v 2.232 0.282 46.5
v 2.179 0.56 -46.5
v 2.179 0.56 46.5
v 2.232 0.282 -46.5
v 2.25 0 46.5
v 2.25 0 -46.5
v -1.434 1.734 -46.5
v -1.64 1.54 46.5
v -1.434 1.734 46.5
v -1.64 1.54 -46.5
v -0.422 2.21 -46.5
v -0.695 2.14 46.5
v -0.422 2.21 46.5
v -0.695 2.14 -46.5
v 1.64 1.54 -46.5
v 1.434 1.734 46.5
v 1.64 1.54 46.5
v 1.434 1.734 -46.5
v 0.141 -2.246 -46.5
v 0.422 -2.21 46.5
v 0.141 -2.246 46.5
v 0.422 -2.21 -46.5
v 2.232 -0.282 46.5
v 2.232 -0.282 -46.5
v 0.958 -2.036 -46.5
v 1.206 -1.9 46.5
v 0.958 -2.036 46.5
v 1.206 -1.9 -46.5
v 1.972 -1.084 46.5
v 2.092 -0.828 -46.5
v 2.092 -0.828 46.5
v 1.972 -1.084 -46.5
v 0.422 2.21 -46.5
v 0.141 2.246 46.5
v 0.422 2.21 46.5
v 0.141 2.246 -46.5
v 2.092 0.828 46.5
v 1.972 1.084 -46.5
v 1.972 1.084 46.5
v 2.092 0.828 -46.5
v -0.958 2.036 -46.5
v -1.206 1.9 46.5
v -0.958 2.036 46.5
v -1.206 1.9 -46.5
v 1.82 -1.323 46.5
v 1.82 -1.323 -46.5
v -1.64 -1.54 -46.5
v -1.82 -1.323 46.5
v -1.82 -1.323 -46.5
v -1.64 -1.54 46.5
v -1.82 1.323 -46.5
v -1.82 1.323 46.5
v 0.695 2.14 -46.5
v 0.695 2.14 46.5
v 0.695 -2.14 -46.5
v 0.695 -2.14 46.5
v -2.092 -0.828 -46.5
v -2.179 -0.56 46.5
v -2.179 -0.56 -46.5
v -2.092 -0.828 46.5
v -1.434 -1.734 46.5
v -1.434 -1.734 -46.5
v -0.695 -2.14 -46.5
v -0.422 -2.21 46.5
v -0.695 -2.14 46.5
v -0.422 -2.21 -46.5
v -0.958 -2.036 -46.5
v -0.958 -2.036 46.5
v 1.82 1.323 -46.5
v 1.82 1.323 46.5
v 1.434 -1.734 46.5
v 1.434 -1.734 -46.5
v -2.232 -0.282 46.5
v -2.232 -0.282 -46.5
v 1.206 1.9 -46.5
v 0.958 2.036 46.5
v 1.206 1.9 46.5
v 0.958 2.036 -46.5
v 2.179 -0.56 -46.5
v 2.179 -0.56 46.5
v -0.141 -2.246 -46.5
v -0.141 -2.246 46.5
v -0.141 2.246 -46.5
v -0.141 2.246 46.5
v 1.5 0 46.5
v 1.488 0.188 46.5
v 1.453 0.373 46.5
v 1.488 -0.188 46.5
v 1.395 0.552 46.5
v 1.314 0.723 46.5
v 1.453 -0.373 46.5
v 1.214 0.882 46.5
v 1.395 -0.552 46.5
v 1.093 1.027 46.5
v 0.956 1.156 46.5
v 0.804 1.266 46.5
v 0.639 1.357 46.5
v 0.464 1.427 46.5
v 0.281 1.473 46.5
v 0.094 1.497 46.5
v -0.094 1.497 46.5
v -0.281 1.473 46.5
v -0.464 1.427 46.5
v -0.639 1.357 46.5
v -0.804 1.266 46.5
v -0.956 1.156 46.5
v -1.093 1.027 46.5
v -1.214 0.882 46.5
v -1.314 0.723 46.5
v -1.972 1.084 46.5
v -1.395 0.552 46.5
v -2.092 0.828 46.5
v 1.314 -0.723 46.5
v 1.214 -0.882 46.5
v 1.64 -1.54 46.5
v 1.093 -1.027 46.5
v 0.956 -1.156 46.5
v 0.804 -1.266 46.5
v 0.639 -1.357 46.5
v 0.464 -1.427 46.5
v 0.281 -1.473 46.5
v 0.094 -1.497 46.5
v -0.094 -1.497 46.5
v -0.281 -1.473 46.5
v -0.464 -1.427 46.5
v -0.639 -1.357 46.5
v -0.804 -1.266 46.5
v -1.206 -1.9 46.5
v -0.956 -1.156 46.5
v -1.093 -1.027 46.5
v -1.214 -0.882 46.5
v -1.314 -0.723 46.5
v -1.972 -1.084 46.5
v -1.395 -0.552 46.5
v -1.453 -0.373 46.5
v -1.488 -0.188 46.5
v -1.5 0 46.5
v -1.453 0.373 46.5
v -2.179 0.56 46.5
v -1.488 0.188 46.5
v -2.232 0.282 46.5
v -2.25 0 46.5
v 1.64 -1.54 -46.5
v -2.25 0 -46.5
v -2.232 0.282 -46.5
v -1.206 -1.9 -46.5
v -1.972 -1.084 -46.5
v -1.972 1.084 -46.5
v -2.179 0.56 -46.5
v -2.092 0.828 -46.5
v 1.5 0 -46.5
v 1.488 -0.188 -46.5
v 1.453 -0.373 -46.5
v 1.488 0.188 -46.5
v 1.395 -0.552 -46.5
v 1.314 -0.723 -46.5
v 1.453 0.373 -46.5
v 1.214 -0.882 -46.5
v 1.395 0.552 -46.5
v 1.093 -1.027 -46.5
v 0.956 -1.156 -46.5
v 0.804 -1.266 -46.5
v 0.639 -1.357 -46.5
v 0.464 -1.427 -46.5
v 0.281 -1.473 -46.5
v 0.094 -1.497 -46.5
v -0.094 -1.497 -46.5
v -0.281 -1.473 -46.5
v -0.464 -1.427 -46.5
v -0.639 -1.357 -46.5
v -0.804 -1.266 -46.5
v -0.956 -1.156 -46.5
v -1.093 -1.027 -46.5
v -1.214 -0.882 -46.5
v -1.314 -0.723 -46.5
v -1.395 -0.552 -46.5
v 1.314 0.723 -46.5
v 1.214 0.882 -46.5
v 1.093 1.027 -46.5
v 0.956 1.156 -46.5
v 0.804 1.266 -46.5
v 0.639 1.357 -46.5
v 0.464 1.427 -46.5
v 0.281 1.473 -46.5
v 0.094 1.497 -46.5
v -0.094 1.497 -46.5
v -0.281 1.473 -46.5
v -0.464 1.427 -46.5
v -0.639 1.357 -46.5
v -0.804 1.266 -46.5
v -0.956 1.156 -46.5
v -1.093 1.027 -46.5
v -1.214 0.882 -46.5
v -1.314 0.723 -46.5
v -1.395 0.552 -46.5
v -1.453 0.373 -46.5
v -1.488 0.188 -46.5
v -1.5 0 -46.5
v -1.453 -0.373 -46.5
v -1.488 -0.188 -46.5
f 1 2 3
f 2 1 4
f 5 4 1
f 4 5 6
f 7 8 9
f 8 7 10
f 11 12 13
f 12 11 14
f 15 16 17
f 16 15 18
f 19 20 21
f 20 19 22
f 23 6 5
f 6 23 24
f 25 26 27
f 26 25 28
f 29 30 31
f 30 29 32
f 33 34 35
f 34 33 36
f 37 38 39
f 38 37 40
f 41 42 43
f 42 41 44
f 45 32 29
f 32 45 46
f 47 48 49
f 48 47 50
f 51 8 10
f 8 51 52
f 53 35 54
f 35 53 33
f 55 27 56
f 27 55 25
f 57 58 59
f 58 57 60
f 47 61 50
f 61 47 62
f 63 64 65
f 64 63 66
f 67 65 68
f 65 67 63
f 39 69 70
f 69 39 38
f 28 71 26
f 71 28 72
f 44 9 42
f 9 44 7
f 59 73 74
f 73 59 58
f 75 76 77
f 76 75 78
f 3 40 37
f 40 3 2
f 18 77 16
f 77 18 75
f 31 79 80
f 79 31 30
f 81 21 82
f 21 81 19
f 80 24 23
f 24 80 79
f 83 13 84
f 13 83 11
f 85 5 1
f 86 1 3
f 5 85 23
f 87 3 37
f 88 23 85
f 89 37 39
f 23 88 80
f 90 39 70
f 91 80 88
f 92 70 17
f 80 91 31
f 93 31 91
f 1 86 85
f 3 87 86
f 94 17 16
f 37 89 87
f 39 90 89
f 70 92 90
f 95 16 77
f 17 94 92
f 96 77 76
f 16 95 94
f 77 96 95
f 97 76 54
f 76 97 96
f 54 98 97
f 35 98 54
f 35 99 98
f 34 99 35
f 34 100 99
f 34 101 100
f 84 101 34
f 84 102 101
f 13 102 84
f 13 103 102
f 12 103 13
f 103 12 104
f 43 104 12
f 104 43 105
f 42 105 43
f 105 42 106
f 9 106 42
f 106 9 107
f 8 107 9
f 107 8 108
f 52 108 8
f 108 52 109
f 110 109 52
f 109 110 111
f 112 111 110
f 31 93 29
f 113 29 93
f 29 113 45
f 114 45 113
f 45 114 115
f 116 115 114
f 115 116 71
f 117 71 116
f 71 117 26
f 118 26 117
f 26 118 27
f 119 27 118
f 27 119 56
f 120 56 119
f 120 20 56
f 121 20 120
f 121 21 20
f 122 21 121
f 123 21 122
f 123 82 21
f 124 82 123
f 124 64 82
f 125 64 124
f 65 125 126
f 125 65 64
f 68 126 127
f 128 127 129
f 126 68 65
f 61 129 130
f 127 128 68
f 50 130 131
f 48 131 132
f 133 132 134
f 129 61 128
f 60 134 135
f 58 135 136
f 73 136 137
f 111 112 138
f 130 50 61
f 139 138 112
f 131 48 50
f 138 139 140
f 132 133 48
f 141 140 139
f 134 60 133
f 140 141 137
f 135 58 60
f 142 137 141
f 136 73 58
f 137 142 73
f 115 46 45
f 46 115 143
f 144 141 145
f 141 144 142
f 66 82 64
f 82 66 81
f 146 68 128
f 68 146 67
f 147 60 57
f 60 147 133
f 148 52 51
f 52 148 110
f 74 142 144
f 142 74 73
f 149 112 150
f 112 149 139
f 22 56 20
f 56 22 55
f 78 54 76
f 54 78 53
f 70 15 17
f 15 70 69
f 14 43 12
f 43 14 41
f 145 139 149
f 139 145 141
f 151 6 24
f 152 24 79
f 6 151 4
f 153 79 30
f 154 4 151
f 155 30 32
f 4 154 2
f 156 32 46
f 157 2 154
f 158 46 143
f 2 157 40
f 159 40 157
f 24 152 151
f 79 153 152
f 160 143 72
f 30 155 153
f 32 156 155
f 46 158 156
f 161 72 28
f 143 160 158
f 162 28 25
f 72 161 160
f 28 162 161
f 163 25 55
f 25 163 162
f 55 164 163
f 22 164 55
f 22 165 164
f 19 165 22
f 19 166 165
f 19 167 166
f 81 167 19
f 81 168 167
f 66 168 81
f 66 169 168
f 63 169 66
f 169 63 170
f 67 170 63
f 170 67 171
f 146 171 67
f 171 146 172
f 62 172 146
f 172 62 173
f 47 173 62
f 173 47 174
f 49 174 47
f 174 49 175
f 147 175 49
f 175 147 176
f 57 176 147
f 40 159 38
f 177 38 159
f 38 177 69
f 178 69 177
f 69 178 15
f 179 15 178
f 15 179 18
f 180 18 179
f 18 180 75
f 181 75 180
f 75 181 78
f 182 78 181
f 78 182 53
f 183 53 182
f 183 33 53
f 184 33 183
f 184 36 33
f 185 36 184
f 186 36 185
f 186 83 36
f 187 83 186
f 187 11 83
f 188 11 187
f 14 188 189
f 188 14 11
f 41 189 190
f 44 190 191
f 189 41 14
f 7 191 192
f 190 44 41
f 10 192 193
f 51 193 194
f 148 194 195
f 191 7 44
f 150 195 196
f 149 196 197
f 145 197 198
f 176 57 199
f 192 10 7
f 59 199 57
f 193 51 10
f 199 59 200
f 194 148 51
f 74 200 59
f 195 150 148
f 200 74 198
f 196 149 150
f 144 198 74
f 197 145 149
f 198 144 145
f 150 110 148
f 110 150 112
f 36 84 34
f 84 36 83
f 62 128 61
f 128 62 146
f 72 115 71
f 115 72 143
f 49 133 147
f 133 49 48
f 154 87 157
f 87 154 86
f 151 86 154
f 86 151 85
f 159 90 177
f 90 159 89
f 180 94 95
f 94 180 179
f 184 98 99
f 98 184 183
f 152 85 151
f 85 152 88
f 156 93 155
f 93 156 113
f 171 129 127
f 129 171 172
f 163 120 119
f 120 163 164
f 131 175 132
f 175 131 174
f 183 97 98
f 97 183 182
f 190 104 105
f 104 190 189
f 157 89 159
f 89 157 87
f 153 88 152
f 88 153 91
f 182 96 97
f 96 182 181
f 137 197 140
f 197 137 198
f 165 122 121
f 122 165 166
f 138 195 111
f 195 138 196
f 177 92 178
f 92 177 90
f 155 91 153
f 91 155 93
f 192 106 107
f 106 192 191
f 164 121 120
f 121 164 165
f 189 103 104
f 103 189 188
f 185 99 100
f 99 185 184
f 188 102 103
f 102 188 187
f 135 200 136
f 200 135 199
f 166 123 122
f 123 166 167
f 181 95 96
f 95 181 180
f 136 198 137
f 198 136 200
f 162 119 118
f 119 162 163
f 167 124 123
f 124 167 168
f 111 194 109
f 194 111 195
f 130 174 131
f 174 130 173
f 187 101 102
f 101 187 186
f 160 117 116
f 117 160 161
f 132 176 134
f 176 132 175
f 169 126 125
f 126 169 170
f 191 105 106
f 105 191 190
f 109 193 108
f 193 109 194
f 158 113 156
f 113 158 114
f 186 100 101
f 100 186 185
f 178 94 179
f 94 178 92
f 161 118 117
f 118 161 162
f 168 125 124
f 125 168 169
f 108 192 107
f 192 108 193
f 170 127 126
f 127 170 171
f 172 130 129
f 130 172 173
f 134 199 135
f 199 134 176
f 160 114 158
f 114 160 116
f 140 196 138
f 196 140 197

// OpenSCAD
$fn = 50;


difference() {
	union() {
		translate(v = [0, 0, -46.5000000000]) {
			cylinder(h = 93, r = 2.2500000000);
		}
	}
	union() {
		translate(v = [0, 0, -100.0000000000]) {
			cylinder(h = 200, r = 1.5000000000);
		}
	}
}
